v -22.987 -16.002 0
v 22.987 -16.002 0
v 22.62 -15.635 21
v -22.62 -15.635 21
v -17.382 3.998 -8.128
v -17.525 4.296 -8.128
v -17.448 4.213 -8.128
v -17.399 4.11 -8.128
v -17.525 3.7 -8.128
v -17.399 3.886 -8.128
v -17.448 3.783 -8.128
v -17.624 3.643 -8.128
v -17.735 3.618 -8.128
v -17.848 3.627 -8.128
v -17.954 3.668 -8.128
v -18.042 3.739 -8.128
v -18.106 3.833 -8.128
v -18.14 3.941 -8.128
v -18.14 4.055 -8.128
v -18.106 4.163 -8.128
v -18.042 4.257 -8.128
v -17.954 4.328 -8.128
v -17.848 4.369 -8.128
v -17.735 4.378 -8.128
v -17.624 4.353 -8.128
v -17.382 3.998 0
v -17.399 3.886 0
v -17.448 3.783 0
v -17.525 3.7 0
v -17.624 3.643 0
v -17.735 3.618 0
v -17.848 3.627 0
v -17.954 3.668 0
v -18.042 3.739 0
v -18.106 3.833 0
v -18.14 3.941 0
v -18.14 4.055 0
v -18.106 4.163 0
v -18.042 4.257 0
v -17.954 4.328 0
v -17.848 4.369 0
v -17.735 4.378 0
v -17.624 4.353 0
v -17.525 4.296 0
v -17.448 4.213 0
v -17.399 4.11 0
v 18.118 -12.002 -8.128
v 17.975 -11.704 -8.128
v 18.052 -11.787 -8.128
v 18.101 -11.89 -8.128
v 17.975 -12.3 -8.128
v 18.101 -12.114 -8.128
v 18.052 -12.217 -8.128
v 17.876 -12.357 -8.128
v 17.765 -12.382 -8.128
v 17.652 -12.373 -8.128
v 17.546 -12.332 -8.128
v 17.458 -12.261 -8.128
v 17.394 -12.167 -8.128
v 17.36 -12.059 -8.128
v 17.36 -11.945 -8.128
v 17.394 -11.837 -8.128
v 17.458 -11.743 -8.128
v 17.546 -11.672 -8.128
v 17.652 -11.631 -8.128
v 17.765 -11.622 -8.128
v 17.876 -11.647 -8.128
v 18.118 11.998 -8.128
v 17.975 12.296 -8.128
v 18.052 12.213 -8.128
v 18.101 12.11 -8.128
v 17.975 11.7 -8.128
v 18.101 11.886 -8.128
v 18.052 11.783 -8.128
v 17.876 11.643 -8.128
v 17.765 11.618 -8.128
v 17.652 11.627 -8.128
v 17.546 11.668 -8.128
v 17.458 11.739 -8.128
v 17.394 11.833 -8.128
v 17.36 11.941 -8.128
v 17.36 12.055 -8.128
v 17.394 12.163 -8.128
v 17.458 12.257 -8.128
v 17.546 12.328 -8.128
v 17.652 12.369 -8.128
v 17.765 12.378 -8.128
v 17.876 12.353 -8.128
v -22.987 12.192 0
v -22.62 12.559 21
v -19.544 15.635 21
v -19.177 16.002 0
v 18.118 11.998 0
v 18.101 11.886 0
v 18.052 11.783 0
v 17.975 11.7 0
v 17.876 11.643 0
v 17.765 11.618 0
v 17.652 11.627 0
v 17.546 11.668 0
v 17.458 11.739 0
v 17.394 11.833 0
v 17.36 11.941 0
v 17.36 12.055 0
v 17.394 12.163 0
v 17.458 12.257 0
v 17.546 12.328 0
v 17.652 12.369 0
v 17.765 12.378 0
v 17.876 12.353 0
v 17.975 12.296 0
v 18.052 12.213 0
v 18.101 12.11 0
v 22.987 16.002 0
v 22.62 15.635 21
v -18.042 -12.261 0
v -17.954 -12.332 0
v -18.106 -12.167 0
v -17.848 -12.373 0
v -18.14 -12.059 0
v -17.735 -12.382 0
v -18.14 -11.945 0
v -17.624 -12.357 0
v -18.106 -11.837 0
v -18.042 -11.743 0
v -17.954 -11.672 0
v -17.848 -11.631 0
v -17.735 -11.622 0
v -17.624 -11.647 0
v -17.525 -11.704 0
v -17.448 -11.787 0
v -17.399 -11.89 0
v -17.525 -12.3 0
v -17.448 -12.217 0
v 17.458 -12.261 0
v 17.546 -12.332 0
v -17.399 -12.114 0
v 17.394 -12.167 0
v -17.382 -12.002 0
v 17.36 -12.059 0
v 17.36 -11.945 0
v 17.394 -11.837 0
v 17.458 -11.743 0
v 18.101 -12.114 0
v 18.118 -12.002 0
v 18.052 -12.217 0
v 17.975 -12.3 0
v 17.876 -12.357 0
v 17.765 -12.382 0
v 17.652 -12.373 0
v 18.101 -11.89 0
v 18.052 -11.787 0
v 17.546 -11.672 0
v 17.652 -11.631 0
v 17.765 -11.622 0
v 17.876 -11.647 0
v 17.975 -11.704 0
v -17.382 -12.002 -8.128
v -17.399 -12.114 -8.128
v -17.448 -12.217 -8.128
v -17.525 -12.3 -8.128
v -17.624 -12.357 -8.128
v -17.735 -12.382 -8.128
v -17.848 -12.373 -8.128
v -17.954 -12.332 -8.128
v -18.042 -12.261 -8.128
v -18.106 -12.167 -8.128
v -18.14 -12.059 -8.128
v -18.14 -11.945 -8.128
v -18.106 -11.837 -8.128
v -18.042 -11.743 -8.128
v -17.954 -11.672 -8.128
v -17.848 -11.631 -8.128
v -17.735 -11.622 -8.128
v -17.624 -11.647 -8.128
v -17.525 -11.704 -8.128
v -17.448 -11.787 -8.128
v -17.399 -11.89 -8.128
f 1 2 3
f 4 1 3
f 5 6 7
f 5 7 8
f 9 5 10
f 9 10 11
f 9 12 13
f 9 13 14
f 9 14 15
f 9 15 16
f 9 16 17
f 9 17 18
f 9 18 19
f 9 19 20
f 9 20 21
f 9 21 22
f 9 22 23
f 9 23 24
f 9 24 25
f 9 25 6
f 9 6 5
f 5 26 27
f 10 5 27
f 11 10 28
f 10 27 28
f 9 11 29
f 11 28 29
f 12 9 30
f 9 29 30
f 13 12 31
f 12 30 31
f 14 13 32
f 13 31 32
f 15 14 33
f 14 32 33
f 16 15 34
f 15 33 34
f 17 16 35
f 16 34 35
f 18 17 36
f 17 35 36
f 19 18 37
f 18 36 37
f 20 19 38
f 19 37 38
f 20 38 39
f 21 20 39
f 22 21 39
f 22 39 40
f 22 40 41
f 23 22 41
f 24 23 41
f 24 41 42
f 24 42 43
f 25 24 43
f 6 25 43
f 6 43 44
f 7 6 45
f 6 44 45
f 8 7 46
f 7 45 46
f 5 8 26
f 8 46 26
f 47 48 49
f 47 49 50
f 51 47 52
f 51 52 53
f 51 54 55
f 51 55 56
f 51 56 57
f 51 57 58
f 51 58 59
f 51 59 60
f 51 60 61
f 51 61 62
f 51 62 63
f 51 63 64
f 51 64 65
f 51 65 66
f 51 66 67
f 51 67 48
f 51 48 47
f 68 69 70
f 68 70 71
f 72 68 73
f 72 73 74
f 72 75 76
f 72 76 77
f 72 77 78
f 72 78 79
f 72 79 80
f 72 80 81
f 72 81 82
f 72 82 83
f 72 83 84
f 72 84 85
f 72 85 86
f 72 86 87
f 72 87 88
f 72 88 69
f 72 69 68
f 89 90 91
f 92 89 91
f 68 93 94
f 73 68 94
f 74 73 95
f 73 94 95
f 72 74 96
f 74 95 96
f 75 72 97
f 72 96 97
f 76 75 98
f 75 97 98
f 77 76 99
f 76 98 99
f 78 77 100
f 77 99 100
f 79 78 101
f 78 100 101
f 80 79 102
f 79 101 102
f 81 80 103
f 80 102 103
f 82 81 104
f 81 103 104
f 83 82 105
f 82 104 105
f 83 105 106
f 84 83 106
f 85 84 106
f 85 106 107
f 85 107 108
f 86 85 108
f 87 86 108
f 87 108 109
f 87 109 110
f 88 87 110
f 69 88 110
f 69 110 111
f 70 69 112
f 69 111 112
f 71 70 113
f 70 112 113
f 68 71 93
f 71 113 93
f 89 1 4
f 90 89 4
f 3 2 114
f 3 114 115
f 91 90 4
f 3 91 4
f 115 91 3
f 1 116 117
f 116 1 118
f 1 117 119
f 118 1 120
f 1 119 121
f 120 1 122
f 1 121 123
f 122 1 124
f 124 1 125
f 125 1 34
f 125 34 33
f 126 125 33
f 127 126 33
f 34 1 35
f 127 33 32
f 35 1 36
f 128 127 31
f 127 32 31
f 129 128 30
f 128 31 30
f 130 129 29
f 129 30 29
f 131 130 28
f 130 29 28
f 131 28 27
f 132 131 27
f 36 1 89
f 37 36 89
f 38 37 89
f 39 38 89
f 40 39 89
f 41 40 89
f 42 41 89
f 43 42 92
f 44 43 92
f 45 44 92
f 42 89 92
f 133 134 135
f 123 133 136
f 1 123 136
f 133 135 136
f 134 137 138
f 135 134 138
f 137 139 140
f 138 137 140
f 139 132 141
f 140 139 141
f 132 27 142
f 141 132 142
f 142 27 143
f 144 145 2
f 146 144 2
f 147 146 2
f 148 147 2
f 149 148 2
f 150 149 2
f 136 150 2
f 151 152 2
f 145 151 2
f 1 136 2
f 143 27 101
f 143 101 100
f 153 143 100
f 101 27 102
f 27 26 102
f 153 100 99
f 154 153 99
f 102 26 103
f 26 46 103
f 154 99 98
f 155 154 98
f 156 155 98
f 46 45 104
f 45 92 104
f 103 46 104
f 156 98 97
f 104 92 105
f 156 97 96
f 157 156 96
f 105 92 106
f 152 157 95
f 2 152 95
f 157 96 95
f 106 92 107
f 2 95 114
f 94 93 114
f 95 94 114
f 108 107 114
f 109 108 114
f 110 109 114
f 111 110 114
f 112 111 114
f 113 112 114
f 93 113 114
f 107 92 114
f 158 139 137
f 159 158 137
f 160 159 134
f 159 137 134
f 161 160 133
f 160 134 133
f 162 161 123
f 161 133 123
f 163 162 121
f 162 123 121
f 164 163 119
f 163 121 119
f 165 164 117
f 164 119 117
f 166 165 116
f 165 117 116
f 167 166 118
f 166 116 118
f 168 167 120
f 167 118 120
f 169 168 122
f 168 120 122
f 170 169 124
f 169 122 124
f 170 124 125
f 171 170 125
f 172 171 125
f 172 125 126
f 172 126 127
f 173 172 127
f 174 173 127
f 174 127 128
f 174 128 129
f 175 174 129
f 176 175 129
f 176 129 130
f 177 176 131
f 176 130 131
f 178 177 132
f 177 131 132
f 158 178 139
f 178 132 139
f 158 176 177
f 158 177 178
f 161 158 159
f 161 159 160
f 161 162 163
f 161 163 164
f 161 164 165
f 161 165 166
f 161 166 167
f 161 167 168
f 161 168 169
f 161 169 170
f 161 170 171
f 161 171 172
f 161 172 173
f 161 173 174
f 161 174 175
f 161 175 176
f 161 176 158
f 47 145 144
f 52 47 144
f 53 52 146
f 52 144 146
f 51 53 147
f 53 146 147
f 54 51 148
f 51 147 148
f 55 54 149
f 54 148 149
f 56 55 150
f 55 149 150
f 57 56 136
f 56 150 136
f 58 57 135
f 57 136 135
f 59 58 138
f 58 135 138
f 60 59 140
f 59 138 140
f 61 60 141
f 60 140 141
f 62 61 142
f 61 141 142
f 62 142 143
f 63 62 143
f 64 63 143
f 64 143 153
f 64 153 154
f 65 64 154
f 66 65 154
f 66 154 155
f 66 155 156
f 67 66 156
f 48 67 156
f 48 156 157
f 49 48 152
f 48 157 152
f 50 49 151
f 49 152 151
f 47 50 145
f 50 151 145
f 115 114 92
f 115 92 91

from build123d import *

# Parameters (mm, degrees)
SKETCH2_W           = 45.974
SKETCH2_H           = 32.004
BOSS_EXTRUDE1_DEPTH = 21
BOSS_EXTRUDE1_TAPER = 1
CUT_EXTRUDE1_DEPTH  = 36.006658981
SKETCH3_R           = 0.381
BOSS_EXTRUDE2_DEPTH = 8.128


with BuildPart() as part:
    # Sketch2 → Boss-Extrude1 (new body)
    with BuildSketch(Plane.XY):
        Rectangle(SKETCH2_W, SKETCH2_H)
    extrude(amount=BOSS_EXTRUDE1_DEPTH, taper=BOSS_EXTRUDE1_TAPER)

    # Sketch4 → Cut-Extrude1 (cut, through all)
    with BuildSketch(Plane.XY.offset(21)):
        Polygon((-19.177, 16.002), (-22.987, 16.002), (-22.987, 12.192), align=None)
    extrude(amount=-CUT_EXTRUDE1_DEPTH, mode=Mode.SUBTRACT)

    # Sketch3 → Boss-Extrude2 (add)
    with BuildSketch(Plane(origin=(0, 0, 0), x_dir=(-1, 0, 0), z_dir=(0, 0, -1))):
        with Locations(Location((-17.737, 11.998, 0), (0, 0, 180))):
            Circle(SKETCH3_R)
        with Locations(Location((17.763, 3.998, 0), (0, 0, 180))):
            Circle(SKETCH3_R)
        with Locations(Location((17.763, -12.002, 0), (0, 0, 180))):
            Circle(SKETCH3_R)
        with Locations(Location((-17.737, -12.002, 0), (0, 0, 180))):
            Circle(SKETCH3_R)
    extrude(amount=BOSS_EXTRUDE2_DEPTH)


solid = part.part
